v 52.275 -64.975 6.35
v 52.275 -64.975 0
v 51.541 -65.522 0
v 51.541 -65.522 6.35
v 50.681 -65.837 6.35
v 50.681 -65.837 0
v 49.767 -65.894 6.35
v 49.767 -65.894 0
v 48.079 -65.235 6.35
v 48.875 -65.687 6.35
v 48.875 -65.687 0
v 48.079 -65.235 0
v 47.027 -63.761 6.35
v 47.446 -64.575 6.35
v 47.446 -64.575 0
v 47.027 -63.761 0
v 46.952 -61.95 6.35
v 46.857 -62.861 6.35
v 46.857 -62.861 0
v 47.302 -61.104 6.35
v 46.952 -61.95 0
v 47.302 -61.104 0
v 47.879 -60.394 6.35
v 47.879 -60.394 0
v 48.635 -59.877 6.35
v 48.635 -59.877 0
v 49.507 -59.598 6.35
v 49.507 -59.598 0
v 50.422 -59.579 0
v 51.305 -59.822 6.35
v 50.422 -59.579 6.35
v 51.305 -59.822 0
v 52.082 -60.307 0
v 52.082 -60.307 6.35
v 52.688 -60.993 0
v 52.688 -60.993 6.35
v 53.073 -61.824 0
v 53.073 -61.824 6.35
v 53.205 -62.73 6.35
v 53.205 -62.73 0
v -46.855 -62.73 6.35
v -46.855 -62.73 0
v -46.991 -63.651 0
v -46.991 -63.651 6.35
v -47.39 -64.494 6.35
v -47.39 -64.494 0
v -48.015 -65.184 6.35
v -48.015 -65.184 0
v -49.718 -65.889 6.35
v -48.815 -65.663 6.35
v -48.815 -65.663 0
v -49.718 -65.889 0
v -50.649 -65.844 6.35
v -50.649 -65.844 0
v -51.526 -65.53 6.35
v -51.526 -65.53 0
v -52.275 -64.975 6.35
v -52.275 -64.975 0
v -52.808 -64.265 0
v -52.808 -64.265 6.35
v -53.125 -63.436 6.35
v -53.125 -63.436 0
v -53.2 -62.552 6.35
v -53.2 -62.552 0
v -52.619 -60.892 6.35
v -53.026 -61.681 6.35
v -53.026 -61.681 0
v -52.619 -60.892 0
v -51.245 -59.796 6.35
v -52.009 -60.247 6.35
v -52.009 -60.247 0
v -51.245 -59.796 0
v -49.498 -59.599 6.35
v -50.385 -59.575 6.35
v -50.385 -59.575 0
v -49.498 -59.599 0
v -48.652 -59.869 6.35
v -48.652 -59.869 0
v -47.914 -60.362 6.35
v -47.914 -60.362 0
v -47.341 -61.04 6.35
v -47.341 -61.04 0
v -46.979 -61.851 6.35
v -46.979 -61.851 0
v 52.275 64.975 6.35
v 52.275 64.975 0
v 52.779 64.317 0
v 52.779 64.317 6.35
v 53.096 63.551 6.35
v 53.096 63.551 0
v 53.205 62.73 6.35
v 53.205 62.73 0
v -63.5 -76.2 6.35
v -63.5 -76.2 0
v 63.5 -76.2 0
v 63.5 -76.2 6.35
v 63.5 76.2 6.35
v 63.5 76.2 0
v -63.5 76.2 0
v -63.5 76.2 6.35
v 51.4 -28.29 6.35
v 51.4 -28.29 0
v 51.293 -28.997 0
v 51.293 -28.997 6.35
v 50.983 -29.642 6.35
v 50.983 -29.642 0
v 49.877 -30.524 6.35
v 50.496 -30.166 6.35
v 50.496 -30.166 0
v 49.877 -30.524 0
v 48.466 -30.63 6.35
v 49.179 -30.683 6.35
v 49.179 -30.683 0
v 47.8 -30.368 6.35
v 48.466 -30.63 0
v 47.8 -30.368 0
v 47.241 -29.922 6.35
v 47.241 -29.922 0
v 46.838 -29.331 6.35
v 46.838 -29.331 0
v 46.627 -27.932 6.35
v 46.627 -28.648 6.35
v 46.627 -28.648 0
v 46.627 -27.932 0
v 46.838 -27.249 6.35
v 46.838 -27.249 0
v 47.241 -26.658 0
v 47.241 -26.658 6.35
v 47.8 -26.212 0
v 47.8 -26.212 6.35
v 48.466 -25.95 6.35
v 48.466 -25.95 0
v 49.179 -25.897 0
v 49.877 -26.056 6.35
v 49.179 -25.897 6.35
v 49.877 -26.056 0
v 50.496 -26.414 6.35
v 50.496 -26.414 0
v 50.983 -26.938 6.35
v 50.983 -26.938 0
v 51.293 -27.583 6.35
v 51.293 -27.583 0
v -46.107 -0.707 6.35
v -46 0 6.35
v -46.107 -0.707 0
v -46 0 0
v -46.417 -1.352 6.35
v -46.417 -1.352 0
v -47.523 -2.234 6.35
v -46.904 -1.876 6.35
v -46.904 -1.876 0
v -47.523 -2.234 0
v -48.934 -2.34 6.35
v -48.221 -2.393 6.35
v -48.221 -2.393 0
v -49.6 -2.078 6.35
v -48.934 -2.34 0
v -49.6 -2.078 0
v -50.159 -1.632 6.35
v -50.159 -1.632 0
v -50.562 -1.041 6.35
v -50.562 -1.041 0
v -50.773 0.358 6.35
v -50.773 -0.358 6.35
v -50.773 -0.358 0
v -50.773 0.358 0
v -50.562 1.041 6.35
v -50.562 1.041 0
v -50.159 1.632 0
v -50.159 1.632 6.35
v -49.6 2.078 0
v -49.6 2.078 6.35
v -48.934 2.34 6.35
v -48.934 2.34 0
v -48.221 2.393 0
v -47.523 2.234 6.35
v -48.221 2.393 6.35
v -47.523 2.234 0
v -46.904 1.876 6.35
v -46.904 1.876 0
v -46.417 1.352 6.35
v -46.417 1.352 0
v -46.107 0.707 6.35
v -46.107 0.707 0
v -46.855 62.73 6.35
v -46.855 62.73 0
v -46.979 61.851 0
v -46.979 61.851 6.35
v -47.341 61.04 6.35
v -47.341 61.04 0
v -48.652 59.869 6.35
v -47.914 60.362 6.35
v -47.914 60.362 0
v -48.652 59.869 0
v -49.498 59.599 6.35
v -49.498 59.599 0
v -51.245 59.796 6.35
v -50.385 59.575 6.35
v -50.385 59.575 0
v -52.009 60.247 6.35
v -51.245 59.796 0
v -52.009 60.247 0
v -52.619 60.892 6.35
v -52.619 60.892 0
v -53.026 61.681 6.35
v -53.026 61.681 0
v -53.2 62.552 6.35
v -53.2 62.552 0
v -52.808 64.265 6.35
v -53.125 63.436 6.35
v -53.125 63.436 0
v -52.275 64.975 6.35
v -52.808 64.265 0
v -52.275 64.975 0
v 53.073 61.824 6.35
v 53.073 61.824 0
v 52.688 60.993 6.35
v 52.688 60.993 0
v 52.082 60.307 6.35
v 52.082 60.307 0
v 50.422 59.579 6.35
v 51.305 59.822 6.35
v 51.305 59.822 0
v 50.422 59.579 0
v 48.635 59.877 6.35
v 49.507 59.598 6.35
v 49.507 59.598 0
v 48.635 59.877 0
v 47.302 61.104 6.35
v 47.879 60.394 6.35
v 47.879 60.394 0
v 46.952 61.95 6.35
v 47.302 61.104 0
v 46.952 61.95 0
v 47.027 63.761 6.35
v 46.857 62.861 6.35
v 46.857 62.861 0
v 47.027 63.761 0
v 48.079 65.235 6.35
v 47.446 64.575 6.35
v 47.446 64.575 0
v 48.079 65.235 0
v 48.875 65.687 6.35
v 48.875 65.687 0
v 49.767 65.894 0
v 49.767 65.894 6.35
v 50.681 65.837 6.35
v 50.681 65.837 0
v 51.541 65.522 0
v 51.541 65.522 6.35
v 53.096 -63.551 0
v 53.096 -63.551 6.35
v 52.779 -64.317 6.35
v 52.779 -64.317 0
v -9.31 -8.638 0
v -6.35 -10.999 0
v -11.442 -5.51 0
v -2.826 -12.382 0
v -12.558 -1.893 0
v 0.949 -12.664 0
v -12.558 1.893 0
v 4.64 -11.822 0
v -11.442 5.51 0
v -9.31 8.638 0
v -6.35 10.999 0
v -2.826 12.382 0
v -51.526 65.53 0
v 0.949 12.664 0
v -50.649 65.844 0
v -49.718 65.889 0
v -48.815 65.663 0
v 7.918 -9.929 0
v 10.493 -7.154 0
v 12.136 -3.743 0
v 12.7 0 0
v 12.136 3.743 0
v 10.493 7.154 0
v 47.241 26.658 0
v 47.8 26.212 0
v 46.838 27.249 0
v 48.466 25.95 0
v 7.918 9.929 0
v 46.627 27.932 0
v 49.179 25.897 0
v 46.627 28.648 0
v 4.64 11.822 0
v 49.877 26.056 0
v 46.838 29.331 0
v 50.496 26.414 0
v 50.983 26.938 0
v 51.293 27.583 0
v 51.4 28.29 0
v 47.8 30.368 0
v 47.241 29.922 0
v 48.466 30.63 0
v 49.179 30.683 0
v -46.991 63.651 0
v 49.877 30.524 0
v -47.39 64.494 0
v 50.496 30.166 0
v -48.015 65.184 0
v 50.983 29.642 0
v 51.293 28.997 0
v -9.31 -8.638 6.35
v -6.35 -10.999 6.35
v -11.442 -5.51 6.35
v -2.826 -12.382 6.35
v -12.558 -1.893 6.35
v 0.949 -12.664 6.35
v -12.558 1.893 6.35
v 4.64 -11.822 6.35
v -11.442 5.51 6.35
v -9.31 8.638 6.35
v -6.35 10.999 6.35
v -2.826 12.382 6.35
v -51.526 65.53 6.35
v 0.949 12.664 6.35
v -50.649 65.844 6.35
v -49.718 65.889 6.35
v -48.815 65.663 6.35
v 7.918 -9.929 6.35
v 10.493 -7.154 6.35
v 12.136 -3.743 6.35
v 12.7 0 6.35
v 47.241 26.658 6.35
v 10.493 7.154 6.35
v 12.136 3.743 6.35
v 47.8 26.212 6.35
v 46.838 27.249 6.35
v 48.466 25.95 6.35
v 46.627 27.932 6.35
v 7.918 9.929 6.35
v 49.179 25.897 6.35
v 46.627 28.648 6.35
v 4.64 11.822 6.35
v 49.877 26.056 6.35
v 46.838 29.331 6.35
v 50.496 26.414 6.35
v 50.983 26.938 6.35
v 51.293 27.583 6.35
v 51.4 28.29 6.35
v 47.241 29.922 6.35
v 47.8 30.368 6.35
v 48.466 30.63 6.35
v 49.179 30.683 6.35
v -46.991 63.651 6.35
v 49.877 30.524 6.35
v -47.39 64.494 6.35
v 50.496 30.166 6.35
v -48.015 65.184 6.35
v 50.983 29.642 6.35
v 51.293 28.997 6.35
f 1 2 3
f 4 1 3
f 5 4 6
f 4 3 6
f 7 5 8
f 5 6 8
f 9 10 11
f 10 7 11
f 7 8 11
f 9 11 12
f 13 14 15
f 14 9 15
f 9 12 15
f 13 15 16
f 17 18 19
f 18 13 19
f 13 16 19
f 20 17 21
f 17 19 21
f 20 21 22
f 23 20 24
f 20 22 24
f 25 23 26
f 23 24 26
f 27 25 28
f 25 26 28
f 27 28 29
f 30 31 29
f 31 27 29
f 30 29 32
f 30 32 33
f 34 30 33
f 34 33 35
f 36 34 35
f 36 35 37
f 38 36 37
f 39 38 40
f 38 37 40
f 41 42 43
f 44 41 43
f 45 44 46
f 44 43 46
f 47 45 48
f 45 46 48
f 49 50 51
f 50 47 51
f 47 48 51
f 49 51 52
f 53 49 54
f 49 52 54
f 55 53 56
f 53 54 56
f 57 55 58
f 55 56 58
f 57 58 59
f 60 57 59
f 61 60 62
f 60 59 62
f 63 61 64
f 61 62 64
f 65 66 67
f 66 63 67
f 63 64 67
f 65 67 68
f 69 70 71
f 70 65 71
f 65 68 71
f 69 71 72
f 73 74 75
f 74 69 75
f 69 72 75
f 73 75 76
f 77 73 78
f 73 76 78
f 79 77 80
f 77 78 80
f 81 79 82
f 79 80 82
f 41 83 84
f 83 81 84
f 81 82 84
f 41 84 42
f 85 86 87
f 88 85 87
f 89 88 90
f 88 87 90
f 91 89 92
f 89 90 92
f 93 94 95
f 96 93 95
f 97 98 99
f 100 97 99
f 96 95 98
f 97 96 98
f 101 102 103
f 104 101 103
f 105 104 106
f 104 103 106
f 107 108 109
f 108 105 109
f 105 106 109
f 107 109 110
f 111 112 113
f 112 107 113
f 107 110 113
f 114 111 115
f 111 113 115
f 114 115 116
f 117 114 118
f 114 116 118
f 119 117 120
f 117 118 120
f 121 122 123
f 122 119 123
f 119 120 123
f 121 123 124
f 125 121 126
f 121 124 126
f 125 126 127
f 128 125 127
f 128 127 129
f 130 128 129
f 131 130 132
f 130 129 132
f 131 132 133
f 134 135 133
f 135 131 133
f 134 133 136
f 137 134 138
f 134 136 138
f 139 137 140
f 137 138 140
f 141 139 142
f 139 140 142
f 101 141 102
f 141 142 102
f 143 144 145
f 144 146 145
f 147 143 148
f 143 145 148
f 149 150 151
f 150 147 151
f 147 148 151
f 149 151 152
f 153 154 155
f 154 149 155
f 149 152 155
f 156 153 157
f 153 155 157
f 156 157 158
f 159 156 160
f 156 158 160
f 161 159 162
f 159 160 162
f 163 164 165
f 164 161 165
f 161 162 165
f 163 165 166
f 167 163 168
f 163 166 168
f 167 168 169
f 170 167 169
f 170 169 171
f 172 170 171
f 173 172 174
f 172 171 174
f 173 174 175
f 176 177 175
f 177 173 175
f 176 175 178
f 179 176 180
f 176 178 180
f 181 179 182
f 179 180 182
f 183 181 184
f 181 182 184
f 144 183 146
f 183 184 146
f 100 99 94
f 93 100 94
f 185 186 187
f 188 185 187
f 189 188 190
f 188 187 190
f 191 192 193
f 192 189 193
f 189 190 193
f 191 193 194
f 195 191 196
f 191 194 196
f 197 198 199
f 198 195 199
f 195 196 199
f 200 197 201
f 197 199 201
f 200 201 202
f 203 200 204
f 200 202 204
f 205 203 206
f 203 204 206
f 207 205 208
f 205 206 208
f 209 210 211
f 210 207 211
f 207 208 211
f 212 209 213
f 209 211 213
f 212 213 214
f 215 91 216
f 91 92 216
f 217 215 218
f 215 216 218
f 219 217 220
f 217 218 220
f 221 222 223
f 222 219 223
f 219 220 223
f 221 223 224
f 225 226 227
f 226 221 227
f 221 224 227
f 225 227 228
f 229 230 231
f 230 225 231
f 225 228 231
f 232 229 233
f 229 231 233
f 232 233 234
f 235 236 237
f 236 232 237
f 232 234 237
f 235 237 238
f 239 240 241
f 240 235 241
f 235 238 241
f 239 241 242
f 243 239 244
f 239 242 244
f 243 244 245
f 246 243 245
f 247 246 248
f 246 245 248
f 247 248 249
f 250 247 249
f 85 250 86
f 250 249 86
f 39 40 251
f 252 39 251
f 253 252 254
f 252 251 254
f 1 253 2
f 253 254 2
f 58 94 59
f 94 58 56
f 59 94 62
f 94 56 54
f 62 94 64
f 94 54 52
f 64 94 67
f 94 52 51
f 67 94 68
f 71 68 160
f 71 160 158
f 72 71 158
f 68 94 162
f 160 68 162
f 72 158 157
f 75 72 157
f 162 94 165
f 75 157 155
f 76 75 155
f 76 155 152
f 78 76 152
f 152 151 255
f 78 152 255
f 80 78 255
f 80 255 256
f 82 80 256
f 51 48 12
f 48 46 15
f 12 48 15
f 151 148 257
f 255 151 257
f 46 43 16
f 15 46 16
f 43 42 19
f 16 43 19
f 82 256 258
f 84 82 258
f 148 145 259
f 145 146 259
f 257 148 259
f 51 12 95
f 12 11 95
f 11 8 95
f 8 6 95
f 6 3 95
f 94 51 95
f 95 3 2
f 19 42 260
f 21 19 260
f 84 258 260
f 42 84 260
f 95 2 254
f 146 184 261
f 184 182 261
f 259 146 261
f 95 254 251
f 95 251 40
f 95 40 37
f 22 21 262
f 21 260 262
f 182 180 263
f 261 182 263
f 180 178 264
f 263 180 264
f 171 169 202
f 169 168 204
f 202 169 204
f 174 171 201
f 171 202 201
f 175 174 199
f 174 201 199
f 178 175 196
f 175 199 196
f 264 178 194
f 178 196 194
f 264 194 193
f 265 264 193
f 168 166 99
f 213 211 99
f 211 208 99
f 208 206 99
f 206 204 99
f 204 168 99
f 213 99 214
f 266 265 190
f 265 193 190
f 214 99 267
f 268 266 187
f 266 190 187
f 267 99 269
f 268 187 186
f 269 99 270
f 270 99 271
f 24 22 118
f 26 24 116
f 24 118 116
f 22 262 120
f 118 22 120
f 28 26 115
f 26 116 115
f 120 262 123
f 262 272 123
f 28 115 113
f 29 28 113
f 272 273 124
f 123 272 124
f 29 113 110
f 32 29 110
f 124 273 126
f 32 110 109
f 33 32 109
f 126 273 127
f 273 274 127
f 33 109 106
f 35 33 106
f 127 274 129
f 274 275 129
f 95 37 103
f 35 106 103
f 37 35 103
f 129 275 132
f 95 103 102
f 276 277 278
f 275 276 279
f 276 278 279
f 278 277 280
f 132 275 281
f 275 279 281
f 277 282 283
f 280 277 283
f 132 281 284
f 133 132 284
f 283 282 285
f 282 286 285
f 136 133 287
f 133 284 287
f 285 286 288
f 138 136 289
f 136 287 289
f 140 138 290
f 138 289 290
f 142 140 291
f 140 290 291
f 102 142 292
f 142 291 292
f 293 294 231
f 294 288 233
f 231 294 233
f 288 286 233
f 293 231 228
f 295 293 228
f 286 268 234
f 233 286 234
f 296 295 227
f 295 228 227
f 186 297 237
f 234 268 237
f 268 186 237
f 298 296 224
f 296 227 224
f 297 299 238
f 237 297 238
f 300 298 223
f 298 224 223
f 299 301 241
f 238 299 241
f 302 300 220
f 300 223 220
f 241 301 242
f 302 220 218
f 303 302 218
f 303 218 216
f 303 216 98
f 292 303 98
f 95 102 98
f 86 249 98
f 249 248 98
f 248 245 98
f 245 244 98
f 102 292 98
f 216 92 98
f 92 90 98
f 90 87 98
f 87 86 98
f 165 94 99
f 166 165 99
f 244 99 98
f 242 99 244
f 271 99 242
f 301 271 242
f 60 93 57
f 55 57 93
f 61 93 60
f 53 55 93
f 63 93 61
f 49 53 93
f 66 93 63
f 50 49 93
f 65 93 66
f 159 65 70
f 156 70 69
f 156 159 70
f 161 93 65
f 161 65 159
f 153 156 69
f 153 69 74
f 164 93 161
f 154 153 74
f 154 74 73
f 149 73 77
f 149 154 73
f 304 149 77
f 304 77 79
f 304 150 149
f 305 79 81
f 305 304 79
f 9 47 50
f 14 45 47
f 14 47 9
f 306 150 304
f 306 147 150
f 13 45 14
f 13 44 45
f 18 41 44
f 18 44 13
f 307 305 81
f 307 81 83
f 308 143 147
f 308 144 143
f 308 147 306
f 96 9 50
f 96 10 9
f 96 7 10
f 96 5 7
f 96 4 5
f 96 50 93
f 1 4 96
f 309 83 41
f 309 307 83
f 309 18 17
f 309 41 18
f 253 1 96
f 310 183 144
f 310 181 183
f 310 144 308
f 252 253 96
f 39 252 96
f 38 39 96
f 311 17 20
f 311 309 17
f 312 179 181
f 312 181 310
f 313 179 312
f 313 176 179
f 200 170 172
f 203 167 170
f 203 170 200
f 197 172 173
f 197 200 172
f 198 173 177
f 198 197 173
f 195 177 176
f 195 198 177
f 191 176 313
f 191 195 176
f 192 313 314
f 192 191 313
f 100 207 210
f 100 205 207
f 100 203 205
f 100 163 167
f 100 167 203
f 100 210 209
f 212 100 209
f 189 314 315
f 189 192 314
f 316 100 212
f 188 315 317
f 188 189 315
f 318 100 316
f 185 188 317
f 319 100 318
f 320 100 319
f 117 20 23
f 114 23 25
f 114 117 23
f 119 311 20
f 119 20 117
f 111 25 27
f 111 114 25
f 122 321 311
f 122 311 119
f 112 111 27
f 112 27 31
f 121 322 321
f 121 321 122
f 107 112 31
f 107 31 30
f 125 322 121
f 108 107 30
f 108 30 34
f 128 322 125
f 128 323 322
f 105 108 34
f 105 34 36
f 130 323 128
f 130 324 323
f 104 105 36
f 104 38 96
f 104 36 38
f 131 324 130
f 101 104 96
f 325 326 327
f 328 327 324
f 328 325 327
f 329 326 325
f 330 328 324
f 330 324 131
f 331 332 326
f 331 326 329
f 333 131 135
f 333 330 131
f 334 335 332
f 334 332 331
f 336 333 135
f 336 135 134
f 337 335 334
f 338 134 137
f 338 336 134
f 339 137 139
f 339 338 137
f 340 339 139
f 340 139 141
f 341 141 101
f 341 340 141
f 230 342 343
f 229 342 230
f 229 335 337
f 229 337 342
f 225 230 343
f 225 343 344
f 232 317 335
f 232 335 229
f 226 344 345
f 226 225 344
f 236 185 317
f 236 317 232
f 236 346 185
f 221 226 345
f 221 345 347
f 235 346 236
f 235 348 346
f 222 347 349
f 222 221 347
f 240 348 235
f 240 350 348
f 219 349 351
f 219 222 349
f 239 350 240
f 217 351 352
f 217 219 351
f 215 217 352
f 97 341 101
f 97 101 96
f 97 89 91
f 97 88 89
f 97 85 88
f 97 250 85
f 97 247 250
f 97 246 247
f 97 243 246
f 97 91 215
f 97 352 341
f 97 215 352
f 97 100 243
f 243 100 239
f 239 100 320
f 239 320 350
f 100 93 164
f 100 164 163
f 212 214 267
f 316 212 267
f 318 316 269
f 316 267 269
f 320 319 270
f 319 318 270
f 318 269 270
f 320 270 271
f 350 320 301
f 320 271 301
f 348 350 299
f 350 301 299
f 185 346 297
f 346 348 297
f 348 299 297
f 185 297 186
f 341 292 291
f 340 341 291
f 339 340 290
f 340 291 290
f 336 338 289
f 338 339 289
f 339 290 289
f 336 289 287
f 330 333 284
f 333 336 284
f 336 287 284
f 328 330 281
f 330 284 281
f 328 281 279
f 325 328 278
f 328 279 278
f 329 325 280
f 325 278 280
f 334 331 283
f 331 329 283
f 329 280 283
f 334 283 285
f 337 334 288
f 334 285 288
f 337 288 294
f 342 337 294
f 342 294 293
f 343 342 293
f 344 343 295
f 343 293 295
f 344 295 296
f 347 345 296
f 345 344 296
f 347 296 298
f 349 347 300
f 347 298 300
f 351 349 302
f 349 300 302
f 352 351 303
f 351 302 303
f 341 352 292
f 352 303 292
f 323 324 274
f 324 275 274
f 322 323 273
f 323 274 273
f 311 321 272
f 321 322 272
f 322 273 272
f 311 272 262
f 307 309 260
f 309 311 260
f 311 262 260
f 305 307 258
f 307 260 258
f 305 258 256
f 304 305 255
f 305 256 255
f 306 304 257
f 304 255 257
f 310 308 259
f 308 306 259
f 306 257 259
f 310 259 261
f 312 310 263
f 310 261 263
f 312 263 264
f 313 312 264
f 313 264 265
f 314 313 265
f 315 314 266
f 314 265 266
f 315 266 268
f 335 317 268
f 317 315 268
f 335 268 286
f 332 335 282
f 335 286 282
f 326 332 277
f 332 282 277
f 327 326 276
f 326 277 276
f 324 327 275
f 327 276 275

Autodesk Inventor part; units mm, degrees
ref_plane "YZ Plane" through (0, 0, 0) normal (1, 0, 0) x (0, 1, 0)
ref_plane "XZ Plane" through (0, 0, 0) normal (0, 1, 0) x (-1, 0, 0)
ref_plane "XY Plane" through (0, 0, 0) normal (0, 0, 1) x (1, 0, 0)
sketch "Sketch1" plane through (0, 0, 0) normal (0, 0, 1) x (1, 0, 0)
  line L0 (-63.5, -76.2) -> (63.5, -76.2)
  line L1 (63.5, -76.2) -> (63.5, 76.2)
  line L2 (63.5, 76.2) -> (-63.5, 76.2)
  line L3 (-63.5, 76.2) -> (-63.5, -76.2)
  line L4 (-63.5, -76.2) -> (63.5, 76.2) construction
  line L5 (63.5, -76.2) -> (-63.5, 76.2) construction
  line L6 (-63.5, 76.2) -> (-50.0296, 62.7296)
  line L7 (-63.5, 76.2) -> (-44.45, 76.2) construction
  line L8 (63.5, 76.2) -> (69.85, 76.2) construction
  line L9 (63.5, 76.2) -> (50.0296, 62.7296)
  line L10 (63.5, -76.2) -> (50.0296, -62.7296)
  line L11 (-63.5, -76.2) -> (-50.0296, -62.7296)
  circle A0 centre (-50.0296, 62.7296) radius 3.175
  circle A1 centre (50.0296, 62.7296) radius 3.175
  circle A2 centre (50.0296, -62.7296) radius 3.175
  circle A3 centre (-50.0296, -62.7296) radius 3.175
  circle A4 centre (0, 0) radius 12.7
  line L12 (0, 0) -> (-48.4, 0) construction
  line L13 (0, 0) -> (12.7, 0)
  line L14 (0, 0) -> (49, 0) construction
  line L15 (49, 0) -> (49, 28.29) construction
  line L16 (49, 0) -> (49, -28.29) construction
  circle A5 centre (49, -28.29) radius 2.4
  circle A6 centre (49, 28.29) radius 2.4
  circle A7 centre (-48.4, 0) radius 2.4
  dimension "d10" = 25.4
  dimension "d0" = 127
  dimension "d1" = 152.4
  dimension "d2" = 19.05
  dimension "d3" = 45
  dimension "d6" = 6.35
  dimension "d7" = 6.35
  dimension "d8" = 6.35
  dimension "d9" = 6.35
  dimension "d11" = 48.4
  dimension "d12" = 49
  dimension "d13" = 28.29
  dimension "d14" = 28.29
  dimension "d15" = 4.8
  dimension "d16" = 4.8
  dimension "d17" = 4.8
extrude "Extrusion1" add sketch "Sketch1" along normal blind 6.35
properties part number "small plate"
